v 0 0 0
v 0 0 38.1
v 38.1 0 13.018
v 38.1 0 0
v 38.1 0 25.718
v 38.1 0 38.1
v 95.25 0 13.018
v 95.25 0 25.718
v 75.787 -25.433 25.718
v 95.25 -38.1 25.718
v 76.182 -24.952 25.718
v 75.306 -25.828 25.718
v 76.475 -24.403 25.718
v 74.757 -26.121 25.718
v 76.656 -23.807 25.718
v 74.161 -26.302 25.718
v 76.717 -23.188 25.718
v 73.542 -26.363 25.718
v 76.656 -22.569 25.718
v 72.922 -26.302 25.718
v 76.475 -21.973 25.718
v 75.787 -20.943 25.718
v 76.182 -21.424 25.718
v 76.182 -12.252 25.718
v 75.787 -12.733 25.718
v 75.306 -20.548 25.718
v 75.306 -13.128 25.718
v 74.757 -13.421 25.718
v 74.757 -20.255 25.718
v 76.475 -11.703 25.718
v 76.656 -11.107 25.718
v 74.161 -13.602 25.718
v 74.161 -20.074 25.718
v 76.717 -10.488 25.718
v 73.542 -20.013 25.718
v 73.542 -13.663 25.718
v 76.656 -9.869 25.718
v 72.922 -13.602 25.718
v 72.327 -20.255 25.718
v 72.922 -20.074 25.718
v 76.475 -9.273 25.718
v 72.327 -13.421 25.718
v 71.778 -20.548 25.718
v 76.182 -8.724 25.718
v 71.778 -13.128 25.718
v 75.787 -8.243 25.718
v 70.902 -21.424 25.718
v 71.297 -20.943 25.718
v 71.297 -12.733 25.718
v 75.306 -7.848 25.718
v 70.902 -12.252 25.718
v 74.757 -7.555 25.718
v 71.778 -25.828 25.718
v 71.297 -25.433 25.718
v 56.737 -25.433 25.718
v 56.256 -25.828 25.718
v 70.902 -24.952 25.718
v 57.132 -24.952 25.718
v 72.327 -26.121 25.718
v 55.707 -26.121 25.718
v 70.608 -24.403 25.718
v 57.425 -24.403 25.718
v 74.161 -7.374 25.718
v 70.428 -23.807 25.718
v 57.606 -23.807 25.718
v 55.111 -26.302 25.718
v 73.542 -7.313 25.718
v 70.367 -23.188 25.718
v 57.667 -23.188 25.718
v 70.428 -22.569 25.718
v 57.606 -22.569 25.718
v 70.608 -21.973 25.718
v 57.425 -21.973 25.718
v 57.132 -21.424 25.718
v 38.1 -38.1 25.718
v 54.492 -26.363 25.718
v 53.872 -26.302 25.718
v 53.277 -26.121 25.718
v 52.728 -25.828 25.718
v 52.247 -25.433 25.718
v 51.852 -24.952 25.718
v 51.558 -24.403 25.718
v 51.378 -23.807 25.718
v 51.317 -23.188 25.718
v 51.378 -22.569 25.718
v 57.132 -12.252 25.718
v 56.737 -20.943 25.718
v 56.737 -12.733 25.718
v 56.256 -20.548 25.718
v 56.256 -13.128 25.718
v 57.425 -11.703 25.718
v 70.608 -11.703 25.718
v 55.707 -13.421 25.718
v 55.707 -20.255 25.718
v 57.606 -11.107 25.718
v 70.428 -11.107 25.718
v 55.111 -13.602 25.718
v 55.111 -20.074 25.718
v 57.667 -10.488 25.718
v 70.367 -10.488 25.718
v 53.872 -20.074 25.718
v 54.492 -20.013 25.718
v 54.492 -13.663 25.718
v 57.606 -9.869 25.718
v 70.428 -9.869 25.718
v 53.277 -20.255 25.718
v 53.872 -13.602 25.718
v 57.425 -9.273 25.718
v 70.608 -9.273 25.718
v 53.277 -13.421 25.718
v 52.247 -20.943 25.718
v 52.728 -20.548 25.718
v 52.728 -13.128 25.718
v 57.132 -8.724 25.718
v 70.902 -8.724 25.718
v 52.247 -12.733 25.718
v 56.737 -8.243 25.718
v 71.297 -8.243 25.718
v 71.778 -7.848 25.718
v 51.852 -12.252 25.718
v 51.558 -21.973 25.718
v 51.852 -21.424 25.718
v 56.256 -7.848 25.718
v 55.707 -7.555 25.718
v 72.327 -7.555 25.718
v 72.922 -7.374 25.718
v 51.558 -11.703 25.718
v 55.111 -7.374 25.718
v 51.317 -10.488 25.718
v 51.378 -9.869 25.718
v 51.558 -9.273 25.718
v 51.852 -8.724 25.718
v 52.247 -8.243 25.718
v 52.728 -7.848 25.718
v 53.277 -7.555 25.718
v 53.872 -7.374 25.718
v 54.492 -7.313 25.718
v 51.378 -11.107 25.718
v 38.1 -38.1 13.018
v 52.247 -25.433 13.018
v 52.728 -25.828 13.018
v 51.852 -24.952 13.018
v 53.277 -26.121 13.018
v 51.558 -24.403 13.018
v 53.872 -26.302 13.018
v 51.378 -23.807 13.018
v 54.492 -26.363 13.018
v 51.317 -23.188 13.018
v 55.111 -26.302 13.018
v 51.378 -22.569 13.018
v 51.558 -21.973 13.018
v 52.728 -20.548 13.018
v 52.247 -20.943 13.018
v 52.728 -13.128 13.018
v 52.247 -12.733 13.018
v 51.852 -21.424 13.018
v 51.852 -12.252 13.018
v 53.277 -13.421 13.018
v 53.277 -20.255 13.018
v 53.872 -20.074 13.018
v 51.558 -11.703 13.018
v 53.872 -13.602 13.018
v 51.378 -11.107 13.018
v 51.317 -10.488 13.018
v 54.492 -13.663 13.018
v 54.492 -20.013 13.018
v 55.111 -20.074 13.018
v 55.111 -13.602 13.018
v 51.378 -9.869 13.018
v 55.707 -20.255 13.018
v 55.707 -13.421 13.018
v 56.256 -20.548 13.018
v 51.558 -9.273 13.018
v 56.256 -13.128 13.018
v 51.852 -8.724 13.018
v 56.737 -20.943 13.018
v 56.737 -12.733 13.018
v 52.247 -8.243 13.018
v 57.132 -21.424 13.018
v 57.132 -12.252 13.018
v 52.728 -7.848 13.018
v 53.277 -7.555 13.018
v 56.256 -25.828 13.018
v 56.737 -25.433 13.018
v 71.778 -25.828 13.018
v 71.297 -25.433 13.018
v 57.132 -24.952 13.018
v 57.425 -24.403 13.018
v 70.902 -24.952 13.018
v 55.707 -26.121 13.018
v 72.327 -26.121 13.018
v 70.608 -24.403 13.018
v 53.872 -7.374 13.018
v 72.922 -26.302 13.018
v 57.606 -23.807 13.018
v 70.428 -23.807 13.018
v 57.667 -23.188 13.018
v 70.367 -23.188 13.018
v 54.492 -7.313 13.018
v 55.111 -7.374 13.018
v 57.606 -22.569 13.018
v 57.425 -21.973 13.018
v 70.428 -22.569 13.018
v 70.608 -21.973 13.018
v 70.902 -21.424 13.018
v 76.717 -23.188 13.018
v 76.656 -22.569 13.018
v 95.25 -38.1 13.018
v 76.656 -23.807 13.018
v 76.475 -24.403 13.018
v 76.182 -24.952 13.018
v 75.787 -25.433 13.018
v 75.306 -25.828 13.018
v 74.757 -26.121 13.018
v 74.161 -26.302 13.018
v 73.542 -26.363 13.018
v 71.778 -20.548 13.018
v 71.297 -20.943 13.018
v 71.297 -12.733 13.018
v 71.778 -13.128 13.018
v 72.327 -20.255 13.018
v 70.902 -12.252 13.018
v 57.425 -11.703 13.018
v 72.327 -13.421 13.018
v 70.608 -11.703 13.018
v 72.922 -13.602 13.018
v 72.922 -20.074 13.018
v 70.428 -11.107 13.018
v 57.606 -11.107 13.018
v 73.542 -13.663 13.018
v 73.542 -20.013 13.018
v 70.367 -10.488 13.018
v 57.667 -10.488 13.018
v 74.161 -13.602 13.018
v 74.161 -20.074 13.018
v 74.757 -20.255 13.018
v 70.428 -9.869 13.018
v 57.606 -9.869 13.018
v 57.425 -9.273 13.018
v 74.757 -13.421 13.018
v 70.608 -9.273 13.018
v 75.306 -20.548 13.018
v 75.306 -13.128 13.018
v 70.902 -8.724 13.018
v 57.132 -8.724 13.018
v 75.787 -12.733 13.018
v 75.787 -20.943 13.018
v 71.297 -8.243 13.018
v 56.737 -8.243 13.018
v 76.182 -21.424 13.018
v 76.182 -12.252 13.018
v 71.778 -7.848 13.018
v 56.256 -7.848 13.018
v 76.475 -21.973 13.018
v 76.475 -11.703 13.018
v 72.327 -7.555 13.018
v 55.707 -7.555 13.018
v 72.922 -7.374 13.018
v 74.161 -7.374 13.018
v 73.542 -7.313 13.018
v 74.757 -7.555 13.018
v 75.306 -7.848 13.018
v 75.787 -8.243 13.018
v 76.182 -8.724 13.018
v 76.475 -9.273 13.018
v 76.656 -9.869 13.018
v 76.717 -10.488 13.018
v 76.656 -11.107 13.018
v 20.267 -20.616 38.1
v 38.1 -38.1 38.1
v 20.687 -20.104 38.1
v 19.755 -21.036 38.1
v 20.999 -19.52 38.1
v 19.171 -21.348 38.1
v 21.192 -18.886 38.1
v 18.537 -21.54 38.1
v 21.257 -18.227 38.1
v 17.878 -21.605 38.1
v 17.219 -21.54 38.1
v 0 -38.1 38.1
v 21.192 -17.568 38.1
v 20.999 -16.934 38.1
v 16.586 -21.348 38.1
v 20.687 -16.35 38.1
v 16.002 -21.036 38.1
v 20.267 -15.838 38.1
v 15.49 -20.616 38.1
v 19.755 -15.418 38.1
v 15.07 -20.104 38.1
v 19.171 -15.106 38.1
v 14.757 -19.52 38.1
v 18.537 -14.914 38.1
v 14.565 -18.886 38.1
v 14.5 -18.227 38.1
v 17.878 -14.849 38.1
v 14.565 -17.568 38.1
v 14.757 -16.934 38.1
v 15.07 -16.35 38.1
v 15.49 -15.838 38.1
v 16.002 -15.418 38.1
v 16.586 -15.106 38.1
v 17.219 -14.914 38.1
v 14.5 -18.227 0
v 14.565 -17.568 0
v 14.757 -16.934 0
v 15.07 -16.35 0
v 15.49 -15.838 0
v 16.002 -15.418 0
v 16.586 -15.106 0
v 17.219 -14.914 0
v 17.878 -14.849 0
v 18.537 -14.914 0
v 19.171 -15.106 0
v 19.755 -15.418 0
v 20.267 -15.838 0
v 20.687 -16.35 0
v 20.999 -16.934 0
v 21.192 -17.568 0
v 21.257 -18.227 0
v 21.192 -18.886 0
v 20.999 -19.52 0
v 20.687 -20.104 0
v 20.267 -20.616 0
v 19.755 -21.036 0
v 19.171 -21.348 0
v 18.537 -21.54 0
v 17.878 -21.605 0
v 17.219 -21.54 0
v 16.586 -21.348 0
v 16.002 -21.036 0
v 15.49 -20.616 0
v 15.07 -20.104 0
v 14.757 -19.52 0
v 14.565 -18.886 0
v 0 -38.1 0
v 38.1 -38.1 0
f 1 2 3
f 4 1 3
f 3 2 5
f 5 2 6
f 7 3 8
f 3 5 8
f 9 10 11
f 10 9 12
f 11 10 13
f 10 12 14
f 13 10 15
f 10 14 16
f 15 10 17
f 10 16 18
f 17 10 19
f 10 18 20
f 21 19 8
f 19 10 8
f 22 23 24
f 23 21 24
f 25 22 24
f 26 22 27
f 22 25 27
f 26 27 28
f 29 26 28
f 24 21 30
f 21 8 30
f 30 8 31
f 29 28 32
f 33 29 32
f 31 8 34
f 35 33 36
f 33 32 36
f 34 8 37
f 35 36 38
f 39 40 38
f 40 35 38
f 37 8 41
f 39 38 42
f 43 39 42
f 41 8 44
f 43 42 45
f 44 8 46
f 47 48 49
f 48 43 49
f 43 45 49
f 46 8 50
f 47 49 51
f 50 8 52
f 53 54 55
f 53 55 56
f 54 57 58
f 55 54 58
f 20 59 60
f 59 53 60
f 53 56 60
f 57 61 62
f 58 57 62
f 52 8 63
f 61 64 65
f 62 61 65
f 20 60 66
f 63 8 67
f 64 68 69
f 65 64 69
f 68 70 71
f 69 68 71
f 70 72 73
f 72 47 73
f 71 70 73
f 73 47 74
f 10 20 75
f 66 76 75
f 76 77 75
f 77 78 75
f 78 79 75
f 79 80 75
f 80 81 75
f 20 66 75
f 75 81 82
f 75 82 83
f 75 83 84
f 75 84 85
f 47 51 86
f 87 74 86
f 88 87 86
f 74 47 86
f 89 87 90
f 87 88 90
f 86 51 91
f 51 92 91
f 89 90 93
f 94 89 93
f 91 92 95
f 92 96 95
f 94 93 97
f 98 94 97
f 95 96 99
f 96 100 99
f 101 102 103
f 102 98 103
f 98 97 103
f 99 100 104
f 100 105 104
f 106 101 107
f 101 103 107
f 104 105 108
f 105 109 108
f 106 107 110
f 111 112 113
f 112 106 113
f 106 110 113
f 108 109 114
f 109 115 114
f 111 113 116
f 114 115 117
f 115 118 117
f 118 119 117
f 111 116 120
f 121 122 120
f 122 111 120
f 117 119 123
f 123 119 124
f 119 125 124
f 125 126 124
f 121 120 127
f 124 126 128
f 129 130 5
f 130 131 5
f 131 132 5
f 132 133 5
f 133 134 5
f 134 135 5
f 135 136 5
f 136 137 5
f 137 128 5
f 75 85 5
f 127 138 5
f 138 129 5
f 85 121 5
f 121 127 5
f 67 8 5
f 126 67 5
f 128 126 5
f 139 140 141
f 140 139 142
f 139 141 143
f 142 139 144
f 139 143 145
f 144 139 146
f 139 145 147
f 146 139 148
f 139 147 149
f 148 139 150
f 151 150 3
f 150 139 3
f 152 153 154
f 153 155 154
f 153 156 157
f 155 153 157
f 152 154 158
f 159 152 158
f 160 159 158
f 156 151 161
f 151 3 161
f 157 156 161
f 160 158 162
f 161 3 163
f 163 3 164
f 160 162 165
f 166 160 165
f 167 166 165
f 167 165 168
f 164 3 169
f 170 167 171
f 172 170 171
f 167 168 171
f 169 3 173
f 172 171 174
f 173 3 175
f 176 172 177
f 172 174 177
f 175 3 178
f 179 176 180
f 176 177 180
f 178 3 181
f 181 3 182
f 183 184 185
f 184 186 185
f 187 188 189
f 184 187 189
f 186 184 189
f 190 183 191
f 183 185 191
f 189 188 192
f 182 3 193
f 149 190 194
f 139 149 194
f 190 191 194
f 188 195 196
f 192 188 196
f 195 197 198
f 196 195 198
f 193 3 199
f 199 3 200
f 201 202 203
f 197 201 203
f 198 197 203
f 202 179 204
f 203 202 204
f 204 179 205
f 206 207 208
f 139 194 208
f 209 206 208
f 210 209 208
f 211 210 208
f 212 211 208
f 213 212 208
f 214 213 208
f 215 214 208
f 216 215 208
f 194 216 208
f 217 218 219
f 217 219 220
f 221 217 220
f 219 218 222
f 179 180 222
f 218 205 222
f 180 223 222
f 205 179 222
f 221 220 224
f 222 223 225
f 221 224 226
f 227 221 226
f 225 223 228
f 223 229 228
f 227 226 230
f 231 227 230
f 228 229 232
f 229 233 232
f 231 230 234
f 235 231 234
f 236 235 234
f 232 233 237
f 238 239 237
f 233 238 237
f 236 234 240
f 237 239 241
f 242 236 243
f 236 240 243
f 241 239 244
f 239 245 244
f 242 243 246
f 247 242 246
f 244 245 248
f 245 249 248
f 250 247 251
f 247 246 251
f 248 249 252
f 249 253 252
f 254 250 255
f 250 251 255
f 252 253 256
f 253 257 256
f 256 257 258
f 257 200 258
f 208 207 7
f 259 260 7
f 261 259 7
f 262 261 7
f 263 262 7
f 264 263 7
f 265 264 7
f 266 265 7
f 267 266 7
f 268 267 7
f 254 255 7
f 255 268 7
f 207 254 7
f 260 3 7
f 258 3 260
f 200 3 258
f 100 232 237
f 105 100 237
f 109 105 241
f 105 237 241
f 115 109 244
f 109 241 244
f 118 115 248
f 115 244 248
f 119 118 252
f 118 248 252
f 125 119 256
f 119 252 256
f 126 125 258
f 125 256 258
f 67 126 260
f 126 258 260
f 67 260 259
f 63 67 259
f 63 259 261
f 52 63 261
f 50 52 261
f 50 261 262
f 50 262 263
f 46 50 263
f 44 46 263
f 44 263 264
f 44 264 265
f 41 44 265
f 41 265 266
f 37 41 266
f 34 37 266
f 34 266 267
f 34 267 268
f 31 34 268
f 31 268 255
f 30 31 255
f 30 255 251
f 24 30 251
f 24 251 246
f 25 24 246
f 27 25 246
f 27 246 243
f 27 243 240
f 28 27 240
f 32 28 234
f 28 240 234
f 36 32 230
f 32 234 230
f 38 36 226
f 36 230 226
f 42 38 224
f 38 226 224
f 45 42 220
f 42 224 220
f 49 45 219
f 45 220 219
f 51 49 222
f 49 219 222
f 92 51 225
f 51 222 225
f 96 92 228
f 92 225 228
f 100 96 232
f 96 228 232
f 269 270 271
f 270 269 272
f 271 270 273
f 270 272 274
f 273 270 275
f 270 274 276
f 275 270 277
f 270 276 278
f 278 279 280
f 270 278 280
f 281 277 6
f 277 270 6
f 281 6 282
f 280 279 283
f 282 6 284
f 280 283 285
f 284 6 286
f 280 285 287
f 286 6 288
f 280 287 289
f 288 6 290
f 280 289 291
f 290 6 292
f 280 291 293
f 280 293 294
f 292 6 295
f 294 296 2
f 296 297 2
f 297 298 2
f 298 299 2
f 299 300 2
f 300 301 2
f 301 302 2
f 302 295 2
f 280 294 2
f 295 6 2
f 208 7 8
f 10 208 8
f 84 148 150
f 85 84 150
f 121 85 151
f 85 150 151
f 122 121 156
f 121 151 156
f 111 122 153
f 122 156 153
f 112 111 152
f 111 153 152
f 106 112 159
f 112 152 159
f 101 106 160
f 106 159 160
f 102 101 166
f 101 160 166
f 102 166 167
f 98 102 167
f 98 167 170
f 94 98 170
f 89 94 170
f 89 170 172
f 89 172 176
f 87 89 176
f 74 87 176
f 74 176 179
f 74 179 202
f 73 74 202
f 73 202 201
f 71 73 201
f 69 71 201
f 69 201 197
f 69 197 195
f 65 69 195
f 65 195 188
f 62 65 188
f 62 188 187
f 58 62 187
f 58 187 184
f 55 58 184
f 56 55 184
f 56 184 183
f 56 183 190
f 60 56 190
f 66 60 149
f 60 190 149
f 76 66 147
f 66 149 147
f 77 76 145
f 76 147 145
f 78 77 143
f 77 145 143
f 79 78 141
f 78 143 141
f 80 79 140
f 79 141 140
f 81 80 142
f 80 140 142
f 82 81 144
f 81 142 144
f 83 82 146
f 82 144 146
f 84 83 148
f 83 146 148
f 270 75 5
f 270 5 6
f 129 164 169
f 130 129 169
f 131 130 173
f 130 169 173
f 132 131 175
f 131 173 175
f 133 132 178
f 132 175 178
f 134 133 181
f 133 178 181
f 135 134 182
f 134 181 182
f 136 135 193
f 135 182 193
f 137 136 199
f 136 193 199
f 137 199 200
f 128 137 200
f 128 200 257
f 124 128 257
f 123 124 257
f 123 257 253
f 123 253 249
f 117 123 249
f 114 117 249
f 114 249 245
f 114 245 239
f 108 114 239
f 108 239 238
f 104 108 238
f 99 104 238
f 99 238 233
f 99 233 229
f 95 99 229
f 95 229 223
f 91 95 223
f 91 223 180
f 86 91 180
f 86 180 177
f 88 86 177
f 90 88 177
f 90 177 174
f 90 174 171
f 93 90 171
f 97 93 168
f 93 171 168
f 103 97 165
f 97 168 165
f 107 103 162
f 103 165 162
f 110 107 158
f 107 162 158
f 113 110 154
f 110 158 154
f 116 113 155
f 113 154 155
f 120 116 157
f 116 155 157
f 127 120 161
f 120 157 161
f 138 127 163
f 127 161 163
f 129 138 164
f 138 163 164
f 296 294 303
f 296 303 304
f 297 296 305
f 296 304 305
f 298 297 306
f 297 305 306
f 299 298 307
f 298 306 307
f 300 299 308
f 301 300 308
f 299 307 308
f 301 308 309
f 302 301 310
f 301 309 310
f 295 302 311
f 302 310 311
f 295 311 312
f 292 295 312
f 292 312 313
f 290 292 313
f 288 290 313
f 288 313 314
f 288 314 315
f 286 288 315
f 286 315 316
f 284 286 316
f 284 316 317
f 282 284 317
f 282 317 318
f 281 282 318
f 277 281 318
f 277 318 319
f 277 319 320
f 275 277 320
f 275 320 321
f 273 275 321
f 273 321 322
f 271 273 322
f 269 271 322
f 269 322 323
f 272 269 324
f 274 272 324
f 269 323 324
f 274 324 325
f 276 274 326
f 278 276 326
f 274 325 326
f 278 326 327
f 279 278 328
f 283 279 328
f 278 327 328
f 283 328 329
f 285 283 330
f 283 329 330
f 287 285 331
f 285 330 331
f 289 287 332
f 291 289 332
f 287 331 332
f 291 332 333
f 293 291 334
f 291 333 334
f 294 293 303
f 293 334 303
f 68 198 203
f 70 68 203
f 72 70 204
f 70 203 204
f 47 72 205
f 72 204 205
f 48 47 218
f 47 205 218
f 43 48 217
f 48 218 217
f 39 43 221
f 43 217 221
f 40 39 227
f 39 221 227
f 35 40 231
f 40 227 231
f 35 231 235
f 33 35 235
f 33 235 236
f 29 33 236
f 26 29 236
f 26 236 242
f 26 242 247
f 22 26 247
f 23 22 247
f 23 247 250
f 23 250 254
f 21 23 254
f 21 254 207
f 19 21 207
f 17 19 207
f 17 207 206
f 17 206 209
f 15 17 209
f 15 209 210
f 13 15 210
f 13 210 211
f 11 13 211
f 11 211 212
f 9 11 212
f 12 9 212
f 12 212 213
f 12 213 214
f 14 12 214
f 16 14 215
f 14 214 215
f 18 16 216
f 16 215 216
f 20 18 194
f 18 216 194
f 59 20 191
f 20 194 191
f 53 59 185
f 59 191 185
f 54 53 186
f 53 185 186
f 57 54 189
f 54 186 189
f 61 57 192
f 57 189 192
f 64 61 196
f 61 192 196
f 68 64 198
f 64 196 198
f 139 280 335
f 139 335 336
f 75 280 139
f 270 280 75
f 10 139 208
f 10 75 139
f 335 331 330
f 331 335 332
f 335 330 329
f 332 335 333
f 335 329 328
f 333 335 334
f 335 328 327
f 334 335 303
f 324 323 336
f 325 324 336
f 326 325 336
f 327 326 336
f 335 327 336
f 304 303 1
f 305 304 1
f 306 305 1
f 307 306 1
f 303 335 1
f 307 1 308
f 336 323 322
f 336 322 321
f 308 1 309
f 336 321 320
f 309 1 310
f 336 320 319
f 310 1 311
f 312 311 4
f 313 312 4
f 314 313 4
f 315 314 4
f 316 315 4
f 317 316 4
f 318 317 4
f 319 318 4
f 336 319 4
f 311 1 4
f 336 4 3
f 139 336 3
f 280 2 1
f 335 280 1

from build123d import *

# Parameters (mm, degrees)
F1_DEPTH = 38.1
F3_D     = 6.7564
F5_D     = 6.35


# Not quite as in the source:
# - the program builds the solid bodies; features that only make, move or delete a surface that nothing else refers to are left out


with BuildPart() as f1:
    # F0 (on Front) → F1 (new body)
    with BuildSketch(Plane.XZ):
        Polygon((0, 38.1), (0, 0), (38.1, 0), (38.1, 13.0175009682), (95.25, 13.0175009682), (95.25, 25.7175009682), (38.1, 25.7175009682), (38.1, 38.1), align=None)
    extrude(amount=F1_DEPTH)

    # F3 (through all)
    with Locations(Plane.XY.offset(38.1)):
        with Locations((17.8784132004, -18.2269066572)):
            Hole(F3_D / 2)

    # F5 (through all)
    with Locations(Plane.XY.offset(25.7175009682)):
        with Locations((54.4917780221, -10.4880234766), (54.4917780221, -23.1880234766), (73.5417780221, -23.1880234766), (73.5417780221, -10.4880234766)):
            Hole(F5_D / 2)


solid = f1.part
